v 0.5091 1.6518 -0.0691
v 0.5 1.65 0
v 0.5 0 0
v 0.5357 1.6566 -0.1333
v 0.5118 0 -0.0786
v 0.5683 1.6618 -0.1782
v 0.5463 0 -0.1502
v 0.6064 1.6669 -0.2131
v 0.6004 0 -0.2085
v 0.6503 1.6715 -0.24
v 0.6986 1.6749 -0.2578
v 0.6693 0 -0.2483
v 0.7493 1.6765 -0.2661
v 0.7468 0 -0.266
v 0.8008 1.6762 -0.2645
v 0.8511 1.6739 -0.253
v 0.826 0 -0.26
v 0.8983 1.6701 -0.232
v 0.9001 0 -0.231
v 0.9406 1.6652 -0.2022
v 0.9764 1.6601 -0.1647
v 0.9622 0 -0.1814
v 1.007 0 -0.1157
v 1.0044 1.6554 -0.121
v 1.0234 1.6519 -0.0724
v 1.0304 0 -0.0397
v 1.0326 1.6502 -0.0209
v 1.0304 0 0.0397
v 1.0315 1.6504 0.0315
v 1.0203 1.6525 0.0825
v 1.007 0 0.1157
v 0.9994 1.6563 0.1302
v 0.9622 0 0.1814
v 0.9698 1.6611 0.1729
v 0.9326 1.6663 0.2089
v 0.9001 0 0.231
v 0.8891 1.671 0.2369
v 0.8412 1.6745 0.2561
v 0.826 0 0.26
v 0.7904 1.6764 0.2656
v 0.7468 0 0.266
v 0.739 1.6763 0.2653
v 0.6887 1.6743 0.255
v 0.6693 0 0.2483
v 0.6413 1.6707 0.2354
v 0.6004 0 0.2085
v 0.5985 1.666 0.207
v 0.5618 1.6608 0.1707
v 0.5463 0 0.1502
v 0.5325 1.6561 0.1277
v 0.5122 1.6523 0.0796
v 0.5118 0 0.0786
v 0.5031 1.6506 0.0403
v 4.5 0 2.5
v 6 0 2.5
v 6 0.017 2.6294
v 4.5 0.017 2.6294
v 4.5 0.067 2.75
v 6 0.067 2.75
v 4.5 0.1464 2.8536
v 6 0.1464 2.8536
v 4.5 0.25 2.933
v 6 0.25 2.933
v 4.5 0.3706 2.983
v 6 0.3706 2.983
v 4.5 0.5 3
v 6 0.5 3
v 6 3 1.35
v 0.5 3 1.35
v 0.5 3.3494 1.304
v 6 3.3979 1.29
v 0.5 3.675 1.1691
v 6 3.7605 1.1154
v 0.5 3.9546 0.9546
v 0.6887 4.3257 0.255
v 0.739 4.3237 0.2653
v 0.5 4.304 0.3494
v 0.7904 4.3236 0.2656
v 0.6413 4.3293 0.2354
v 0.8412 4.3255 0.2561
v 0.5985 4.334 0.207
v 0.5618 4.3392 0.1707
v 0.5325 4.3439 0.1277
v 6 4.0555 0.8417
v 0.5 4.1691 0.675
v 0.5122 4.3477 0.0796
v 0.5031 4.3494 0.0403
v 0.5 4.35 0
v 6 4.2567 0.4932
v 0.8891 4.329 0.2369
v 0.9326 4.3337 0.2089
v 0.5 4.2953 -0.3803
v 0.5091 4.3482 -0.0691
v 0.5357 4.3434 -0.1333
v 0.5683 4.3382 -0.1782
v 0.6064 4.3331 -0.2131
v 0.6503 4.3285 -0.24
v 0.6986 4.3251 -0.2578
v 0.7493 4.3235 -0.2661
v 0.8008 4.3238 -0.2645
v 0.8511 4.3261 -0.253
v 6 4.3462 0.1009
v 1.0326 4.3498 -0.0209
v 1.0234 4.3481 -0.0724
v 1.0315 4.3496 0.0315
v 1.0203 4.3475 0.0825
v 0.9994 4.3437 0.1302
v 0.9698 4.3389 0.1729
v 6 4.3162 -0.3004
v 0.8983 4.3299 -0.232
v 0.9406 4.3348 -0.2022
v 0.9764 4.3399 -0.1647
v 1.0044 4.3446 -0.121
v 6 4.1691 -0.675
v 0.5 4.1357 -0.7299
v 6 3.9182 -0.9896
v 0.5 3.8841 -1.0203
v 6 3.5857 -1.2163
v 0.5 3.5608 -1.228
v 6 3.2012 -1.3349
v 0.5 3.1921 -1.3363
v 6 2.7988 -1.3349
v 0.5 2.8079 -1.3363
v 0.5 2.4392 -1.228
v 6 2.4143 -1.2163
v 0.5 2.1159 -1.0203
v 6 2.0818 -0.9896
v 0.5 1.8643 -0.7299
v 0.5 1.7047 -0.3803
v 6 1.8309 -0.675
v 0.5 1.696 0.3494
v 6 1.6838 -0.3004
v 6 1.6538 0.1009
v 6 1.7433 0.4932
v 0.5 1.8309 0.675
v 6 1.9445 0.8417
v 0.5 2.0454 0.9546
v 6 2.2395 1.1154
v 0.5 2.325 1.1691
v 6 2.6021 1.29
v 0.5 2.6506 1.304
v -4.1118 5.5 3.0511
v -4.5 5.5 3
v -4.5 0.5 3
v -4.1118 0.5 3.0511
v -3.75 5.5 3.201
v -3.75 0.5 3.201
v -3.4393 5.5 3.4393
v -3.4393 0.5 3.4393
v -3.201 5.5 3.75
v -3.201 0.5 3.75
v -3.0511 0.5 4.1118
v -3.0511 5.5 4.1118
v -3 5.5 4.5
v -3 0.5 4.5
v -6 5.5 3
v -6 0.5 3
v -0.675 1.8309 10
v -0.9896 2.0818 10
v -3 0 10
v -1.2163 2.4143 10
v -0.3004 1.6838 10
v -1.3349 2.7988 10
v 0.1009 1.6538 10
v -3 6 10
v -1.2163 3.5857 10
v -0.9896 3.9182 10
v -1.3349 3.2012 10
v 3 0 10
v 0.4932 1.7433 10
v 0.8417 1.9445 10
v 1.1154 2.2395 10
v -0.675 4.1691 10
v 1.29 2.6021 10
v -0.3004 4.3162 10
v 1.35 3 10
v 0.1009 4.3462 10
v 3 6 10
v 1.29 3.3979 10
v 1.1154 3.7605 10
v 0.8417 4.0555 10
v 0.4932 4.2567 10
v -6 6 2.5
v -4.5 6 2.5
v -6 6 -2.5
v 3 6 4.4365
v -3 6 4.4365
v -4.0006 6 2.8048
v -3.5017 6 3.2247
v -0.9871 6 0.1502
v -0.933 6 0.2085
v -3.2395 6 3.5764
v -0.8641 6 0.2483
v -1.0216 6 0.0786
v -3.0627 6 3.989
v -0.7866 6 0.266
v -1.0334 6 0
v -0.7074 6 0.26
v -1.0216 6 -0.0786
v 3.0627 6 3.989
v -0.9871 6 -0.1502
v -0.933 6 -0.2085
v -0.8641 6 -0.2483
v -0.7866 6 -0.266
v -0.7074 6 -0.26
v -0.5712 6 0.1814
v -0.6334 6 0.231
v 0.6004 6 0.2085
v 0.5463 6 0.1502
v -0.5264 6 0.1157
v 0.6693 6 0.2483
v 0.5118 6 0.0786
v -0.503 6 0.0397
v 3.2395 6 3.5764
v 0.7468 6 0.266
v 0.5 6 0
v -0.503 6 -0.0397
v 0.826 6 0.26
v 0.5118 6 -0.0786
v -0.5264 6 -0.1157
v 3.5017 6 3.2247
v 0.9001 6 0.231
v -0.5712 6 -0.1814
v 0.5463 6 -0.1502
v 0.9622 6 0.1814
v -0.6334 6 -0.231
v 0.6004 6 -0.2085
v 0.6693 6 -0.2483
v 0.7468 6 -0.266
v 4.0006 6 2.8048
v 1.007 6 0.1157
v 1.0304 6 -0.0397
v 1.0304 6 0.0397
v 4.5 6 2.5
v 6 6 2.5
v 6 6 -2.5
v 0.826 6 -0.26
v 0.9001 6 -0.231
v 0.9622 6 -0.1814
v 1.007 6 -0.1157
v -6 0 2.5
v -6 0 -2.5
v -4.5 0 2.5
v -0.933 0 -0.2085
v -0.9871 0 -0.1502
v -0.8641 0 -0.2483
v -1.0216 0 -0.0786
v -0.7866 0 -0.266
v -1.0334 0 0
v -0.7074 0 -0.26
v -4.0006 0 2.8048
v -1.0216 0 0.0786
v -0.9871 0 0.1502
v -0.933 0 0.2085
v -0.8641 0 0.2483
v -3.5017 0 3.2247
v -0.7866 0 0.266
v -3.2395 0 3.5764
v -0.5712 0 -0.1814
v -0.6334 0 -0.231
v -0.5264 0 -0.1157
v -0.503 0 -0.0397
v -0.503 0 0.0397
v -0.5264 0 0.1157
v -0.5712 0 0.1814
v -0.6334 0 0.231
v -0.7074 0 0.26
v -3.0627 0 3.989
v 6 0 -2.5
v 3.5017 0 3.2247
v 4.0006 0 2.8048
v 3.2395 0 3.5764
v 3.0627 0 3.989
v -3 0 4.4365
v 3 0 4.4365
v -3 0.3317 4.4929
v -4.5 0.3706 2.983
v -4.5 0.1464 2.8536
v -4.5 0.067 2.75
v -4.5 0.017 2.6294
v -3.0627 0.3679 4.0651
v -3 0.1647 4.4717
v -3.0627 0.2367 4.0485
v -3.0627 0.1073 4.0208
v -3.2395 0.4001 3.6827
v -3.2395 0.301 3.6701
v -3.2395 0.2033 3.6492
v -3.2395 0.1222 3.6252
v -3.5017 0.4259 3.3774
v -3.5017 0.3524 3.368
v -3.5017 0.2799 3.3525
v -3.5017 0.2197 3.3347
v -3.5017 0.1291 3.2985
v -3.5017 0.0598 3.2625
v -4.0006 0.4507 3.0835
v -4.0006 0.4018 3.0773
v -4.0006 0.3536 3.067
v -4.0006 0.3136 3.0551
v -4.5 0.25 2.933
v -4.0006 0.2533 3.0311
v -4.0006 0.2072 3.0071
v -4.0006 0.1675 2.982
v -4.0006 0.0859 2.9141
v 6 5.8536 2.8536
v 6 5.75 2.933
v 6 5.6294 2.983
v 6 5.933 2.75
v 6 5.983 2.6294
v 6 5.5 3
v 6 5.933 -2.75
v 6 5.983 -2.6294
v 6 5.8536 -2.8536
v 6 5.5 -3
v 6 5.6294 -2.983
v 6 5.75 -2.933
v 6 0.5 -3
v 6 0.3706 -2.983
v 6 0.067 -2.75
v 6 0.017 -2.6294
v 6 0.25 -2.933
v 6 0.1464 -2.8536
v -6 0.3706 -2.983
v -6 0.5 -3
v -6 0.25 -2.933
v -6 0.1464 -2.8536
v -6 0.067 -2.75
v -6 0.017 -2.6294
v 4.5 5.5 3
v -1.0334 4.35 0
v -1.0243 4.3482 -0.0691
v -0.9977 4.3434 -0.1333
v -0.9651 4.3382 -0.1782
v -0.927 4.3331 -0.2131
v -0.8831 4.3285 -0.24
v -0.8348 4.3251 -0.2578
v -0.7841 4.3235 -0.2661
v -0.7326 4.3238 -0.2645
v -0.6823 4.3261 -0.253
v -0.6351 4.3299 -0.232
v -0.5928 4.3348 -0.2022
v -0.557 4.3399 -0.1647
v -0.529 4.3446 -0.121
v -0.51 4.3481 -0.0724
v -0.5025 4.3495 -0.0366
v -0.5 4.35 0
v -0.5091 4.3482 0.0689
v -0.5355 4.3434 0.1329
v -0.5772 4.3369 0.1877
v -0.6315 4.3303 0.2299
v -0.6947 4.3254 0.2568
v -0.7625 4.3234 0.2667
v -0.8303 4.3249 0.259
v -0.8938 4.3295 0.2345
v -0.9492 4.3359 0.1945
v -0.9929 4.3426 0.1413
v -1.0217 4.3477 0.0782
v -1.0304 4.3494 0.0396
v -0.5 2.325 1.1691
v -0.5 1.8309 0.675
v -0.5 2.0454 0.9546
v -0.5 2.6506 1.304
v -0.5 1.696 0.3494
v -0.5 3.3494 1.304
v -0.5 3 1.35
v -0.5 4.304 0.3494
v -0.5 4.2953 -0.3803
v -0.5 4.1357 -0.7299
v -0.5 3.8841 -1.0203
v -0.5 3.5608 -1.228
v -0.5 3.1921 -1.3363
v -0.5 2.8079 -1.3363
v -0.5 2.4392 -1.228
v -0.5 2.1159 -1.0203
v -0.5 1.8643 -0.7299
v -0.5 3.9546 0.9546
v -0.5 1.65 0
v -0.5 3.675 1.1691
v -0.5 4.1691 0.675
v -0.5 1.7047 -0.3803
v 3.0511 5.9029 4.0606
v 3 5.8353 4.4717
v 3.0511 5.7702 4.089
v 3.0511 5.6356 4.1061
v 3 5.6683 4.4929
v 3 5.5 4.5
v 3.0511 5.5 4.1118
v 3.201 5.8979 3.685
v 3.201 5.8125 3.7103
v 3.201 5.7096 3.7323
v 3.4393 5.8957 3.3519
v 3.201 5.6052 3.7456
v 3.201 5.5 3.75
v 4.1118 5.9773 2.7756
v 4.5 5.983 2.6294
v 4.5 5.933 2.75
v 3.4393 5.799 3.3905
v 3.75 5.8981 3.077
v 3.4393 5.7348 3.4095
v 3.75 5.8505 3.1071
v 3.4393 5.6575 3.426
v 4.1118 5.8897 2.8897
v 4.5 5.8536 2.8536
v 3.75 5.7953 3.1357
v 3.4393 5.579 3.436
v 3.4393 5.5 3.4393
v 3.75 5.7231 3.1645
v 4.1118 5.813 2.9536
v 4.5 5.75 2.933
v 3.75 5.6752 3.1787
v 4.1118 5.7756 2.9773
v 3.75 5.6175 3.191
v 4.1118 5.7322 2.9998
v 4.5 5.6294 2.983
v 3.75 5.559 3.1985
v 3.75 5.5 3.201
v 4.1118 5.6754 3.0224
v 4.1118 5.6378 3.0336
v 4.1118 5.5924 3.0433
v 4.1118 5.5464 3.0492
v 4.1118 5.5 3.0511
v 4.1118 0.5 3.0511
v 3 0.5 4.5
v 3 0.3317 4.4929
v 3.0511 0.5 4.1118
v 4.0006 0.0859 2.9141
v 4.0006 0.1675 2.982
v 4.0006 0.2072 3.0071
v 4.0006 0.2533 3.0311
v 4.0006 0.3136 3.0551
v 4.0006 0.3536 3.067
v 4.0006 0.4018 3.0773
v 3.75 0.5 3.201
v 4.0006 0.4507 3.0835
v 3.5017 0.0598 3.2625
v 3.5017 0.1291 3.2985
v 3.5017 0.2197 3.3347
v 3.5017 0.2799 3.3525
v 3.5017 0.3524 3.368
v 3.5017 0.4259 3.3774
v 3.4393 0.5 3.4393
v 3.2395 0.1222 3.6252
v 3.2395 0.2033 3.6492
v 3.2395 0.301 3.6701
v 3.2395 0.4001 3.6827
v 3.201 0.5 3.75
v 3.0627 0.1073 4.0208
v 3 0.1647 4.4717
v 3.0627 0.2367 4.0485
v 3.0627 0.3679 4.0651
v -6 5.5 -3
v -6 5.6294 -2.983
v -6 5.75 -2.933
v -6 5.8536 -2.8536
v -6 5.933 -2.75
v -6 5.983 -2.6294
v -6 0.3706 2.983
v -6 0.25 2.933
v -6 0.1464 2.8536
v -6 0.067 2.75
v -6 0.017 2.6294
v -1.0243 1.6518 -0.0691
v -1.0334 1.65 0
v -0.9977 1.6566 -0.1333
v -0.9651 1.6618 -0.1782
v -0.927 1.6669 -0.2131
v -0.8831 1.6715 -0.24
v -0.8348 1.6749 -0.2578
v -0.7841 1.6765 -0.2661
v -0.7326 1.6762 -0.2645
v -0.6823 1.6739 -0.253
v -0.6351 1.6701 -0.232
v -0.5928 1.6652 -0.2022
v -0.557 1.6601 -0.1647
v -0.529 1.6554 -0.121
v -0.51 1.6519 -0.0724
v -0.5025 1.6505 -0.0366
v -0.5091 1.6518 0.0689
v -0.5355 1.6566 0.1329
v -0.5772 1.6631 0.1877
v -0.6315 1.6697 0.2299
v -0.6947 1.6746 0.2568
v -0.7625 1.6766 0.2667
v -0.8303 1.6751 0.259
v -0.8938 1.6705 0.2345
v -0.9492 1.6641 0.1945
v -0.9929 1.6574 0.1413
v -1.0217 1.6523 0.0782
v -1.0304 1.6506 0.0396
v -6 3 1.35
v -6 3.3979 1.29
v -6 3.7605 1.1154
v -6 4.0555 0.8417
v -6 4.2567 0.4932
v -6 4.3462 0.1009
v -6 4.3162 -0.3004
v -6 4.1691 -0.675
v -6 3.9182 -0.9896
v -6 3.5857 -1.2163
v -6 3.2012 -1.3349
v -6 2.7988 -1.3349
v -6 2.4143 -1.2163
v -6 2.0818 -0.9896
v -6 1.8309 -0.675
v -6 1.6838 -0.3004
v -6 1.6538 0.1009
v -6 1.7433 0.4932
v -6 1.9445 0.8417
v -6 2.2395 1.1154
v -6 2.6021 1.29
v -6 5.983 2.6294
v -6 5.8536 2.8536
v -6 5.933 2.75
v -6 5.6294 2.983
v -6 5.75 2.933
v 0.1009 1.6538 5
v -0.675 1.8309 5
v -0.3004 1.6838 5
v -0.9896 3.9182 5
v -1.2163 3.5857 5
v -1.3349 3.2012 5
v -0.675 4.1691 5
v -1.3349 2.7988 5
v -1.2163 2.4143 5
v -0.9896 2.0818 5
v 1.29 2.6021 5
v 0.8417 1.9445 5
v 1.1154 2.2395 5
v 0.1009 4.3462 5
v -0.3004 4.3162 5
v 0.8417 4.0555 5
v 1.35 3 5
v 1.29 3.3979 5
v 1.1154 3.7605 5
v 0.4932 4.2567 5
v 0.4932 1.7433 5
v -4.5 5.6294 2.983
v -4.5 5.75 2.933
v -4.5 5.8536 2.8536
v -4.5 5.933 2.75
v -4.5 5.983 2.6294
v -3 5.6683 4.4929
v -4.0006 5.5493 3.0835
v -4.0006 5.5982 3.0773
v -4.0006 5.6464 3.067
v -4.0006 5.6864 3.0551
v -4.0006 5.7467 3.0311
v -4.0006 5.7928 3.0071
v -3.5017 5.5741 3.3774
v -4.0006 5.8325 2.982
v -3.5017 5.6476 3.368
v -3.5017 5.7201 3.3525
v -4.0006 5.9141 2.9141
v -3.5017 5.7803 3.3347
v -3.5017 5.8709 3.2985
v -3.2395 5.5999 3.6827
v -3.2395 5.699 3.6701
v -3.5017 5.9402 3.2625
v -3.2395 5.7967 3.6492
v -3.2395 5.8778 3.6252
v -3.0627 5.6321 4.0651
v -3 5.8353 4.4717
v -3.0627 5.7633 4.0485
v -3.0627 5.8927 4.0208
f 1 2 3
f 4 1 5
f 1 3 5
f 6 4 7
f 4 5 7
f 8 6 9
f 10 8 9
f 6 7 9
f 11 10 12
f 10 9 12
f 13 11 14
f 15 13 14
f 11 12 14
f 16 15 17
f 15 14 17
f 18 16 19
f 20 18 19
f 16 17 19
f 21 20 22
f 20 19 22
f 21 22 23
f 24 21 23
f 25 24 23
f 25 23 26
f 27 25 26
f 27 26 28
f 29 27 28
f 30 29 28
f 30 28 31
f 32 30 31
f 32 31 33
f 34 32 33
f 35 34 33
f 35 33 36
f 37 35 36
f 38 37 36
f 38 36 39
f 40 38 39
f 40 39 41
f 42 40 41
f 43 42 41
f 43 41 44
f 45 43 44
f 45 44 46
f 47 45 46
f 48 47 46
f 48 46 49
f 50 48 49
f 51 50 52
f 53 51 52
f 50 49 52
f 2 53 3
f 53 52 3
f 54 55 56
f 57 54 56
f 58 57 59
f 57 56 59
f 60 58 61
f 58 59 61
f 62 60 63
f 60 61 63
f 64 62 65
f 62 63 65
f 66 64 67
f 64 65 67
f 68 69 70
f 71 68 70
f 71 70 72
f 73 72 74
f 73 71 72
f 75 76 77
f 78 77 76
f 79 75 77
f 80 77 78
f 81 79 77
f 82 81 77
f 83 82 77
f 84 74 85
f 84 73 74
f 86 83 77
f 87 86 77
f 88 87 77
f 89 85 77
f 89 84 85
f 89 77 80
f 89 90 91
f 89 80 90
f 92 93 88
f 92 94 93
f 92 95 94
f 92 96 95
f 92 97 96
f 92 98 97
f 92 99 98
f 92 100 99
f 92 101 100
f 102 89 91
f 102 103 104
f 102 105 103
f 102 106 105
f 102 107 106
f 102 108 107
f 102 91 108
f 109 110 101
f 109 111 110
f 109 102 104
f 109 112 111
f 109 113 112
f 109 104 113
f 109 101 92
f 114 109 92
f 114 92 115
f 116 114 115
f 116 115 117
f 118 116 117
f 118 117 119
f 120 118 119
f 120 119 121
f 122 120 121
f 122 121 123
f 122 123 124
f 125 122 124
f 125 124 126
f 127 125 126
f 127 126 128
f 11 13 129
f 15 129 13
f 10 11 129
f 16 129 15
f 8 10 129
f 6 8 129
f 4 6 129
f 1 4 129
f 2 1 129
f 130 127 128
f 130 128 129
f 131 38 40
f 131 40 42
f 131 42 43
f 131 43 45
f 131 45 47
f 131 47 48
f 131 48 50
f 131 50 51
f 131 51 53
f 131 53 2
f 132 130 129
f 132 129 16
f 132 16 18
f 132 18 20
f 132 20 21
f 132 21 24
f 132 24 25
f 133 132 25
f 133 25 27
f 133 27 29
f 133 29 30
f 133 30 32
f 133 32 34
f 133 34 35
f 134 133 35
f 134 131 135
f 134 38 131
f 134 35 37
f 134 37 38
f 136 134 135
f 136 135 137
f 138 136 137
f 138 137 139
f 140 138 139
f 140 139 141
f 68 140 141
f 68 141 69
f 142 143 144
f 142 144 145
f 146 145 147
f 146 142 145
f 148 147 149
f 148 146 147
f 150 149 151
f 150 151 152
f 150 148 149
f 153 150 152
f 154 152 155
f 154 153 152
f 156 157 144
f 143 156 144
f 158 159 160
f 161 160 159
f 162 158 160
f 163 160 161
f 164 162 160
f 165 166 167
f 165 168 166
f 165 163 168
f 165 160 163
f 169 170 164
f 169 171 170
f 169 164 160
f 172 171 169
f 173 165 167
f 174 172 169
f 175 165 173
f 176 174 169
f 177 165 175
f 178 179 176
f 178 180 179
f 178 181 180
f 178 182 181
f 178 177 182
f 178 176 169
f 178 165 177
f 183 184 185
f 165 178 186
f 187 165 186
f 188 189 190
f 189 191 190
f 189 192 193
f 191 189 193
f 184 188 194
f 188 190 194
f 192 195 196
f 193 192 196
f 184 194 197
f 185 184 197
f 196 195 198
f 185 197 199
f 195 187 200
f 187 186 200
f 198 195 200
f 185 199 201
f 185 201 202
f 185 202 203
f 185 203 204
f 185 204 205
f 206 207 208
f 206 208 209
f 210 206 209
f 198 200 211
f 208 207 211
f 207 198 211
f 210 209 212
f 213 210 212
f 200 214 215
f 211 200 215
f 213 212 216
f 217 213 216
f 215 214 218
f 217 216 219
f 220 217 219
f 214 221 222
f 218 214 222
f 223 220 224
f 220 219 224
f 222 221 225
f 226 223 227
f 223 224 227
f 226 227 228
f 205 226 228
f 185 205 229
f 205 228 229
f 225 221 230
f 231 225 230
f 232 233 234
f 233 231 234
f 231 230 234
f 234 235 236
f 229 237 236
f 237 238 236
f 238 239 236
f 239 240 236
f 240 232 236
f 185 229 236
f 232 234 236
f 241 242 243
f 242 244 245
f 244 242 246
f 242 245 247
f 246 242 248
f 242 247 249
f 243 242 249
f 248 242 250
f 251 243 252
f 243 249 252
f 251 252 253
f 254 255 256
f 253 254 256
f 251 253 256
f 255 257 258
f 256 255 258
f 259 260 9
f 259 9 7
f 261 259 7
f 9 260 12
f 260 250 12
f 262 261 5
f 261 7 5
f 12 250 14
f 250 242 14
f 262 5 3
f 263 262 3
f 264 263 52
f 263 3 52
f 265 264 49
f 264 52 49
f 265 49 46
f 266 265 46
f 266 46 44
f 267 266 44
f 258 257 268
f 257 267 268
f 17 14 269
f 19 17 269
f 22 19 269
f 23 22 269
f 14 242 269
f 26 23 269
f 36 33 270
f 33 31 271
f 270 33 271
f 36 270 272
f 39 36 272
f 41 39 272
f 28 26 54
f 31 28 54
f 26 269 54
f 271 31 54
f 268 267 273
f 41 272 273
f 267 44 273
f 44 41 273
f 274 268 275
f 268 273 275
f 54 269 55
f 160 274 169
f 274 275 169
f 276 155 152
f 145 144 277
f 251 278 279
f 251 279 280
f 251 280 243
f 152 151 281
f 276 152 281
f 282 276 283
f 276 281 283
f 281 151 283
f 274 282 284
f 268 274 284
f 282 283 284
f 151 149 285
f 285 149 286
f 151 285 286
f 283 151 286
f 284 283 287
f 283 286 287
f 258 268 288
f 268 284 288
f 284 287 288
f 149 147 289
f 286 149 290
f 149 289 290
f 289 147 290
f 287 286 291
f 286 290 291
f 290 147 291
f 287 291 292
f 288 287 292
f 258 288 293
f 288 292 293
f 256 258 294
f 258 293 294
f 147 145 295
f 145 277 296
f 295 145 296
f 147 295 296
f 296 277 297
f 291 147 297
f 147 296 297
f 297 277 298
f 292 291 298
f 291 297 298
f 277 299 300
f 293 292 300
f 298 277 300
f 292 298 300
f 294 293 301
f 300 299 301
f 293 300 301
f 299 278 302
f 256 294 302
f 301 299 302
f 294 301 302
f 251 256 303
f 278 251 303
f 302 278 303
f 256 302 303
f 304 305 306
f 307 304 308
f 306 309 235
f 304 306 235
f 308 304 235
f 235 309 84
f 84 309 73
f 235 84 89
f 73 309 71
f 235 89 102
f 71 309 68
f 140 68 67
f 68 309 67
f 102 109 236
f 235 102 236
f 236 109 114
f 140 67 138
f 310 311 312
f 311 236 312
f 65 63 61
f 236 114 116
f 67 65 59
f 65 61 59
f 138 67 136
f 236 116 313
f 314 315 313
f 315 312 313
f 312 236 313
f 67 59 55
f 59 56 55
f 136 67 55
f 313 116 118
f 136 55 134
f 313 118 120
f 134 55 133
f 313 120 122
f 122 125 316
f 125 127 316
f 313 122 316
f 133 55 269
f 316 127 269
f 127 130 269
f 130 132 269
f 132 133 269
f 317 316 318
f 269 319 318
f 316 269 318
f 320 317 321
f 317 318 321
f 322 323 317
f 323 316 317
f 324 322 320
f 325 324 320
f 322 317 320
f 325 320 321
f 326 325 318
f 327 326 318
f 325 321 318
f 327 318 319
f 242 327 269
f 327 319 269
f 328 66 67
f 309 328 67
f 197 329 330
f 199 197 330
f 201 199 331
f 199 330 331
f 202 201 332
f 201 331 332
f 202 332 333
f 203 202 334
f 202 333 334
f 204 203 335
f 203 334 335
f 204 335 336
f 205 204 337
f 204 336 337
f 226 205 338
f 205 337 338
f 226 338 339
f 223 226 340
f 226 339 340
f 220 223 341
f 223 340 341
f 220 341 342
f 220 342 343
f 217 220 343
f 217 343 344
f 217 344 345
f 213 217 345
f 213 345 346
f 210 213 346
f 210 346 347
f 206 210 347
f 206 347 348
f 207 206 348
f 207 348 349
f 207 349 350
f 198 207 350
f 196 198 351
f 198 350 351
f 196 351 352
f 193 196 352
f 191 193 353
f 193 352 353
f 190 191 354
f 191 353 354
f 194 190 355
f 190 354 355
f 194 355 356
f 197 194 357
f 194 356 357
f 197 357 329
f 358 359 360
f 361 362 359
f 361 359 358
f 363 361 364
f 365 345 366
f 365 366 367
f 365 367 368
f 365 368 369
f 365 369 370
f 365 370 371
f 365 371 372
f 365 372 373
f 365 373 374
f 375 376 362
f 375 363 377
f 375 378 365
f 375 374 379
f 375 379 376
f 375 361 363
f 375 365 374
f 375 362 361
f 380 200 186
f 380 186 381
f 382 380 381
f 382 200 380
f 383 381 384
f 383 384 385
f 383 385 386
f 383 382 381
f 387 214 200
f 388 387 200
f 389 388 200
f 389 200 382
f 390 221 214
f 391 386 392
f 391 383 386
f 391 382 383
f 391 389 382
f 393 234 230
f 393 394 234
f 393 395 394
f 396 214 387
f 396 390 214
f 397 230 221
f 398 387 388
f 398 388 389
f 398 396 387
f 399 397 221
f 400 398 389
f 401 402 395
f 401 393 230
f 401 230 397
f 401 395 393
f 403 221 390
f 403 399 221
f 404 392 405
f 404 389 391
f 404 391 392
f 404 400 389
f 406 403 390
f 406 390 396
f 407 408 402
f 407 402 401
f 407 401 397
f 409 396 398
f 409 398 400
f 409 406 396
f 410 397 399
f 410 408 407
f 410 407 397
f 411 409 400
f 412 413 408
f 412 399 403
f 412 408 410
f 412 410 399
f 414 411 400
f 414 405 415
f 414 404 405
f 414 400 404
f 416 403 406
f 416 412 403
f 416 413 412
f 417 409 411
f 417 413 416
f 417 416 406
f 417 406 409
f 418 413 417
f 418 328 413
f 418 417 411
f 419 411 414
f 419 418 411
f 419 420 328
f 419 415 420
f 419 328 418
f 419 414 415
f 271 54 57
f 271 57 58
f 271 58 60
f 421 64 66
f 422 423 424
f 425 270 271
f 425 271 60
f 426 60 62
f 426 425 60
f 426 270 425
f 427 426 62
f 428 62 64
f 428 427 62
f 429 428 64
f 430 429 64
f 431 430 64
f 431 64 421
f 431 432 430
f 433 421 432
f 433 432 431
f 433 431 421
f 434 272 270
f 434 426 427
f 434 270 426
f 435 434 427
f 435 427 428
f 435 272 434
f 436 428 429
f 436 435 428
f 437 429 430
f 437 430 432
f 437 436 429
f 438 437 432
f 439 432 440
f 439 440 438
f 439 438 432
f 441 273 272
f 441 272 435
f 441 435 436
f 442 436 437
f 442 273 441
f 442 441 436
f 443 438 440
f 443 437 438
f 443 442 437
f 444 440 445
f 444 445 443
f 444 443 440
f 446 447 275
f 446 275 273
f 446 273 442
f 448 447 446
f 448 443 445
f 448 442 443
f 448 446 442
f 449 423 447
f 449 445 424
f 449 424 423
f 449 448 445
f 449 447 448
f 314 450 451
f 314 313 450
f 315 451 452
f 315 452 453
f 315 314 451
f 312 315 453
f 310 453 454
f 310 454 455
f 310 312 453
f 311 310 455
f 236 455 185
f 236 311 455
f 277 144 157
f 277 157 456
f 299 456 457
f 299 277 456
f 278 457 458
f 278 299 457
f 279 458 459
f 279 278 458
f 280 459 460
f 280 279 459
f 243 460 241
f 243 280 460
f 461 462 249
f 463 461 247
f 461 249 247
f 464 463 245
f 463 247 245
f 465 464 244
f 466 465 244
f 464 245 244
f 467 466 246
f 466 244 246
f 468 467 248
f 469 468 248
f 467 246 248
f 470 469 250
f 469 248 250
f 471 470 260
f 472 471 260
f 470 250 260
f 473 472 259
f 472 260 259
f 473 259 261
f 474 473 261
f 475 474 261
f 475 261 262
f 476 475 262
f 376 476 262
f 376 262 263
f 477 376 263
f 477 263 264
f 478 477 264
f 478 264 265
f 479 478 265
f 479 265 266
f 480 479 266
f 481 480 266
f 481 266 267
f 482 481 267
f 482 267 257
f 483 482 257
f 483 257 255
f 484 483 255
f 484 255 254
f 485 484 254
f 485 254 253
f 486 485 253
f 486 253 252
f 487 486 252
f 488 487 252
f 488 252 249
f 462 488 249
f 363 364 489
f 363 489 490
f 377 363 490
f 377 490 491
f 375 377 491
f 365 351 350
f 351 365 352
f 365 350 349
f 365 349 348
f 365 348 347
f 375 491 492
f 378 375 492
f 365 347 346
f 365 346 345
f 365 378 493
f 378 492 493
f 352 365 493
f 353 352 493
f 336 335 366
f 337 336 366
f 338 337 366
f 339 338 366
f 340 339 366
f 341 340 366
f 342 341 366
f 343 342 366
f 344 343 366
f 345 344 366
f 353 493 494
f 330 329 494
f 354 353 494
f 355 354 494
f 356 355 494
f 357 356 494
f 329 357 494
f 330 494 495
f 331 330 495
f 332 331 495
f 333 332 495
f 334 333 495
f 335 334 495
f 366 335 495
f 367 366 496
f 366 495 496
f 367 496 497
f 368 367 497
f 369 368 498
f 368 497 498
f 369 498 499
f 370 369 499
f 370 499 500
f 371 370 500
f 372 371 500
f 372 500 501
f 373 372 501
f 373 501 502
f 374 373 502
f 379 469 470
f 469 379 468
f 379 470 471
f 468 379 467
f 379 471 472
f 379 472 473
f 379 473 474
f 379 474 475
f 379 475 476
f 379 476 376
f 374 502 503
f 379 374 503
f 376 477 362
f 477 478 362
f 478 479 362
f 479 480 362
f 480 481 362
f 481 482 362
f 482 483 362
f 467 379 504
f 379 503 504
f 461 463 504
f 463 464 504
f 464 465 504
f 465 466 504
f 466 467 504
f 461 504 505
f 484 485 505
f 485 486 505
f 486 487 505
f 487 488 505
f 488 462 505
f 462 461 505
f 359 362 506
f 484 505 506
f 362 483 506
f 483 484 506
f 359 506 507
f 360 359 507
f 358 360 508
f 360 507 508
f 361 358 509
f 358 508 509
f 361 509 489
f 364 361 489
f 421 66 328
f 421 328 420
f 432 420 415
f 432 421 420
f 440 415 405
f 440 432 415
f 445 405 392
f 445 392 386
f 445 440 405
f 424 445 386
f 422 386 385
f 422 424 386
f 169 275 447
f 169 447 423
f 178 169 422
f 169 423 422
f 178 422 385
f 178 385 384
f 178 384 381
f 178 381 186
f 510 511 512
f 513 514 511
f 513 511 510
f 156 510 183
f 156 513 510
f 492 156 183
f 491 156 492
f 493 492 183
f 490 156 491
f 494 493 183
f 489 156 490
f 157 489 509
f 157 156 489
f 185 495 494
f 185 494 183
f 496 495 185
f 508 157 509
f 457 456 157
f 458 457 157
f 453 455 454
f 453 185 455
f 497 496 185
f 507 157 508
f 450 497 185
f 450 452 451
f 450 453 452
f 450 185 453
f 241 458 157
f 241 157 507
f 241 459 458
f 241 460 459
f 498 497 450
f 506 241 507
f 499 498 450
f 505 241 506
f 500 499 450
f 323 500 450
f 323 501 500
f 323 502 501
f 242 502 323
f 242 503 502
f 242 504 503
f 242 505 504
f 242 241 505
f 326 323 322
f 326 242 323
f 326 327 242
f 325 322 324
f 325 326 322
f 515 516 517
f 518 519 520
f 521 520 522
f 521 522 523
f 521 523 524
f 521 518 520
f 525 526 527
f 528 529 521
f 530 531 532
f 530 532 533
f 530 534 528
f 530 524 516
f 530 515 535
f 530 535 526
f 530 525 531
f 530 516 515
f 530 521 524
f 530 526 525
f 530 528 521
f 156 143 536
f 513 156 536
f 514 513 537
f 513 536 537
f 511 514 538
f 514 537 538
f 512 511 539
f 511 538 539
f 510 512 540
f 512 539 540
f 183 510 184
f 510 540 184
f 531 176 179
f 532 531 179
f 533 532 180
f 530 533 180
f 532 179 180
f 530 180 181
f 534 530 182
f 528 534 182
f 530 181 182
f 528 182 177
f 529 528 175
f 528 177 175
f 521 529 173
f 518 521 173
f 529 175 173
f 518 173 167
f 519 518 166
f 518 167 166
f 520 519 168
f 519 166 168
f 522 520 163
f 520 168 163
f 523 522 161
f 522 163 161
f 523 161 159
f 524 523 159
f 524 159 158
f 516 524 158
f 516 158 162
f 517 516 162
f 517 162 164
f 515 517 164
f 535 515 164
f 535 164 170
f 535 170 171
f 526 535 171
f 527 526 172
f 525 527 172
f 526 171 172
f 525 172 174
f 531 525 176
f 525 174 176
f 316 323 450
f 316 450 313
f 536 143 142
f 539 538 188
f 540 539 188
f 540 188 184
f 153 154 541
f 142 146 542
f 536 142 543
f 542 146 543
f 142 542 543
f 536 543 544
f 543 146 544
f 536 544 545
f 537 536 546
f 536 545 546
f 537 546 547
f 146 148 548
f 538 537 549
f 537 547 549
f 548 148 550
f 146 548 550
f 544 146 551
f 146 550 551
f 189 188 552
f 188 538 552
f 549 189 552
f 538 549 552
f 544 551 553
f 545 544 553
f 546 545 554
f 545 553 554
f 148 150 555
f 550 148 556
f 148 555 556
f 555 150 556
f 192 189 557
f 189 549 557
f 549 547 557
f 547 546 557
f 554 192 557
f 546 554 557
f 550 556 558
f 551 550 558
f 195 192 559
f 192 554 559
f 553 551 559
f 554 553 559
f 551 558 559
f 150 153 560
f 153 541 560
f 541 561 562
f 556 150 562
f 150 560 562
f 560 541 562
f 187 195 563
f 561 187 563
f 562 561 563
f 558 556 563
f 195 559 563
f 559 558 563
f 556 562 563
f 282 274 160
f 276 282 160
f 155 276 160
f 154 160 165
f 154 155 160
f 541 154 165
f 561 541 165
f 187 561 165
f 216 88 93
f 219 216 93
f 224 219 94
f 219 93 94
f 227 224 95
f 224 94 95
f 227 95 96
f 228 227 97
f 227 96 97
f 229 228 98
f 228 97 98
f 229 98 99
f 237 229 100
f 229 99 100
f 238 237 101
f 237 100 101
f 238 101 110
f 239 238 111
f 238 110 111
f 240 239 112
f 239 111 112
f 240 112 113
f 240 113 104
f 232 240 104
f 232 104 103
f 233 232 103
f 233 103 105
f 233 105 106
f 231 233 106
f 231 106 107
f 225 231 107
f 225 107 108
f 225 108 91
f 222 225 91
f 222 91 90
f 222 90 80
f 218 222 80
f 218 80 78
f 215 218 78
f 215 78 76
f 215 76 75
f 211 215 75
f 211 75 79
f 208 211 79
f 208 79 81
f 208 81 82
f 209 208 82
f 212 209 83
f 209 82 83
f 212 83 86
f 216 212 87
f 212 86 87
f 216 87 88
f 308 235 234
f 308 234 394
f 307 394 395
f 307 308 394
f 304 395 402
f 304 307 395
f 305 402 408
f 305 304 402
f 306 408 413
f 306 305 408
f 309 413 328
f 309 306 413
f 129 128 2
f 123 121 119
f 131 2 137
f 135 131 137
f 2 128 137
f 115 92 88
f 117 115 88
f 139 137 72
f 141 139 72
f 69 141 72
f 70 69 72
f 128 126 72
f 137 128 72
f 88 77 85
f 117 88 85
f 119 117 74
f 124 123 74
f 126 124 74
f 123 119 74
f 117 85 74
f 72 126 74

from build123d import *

# Parameters (mm, degrees)
SKETCH1_W                   = 12
SKETCH1_H                   = 6
BOSS_EXTRUDE1_DEPTH         = 6
F_75_0_021_DIAMETER_HOLE1_D = 0.5334
SKETCH15_W                  = 6
SKETCH15_H                  = 6
BOSS_EXTRUDE2_DEPTH         = 7
FILLET4_R                   = 0.5
FILLET3_R                   = 1.5
SKETCH19_R                  = 1.35
CUT_EXTRUDE1_DEPTH          = 5.5
SKETCH16_R                  = 1.35
CUT_EXTRUDE2_DEPTH          = 5


with BuildPart() as part:
    # Sketch1 → Boss-Extrude1 (new body)
    with BuildSketch(Plane(origin=(0, 0, 0), x_dir=(1, 0, 0), z_dir=(0, 1, 0))):
        Rectangle(SKETCH1_W, SKETCH1_H)
    extrude(amount=BOSS_EXTRUDE1_DEPTH)

    # #75 (0.021) Diameter Hole1 (through all)
    with Locations(Plane(origin=(0, 6, 0), x_dir=(1, 0, 0), z_dir=(0, 1, 0))):
        with Locations((0.7667, 0), (-0.7667, 0)):
            Hole(F_75_0_021_DIAMETER_HOLE1_D / 2)

    # Sketch15 → Boss-Extrude2 (add)
    with BuildSketch(Plane.XY.offset(3)):
        with Locations((0, 3)):
            Rectangle(SKETCH15_W, SKETCH15_H)
    extrude(amount=BOSS_EXTRUDE2_DEPTH)

    # Fillet4
    fillet4_edges = [part.edges().sort_by_distance(p)[0] for p in [
        (4.5, 6, 3),
        (4.5, 0, 3),
        (-4.5, 0, 3),
        (0, 0, -3),
        (0, 6, -3),
        (-4.5, 6, 3),
    ]]
    fillet(fillet4_edges, radius=FILLET4_R)

    # Fillet3
    fillet3_edges = [part.edges().sort_by_distance(p)[0] for p in [
        (-3, 3, 3),
        (-3, 0.146446609, 2.853553391),
        (-3, 5.853553391, 2.853553391),
    ]]
    fillet(fillet3_edges, radius=FILLET3_R)
    fillet3_2_edges = [part.edges().sort_by_distance(p)[0] for p in [
        (3, 5.853553391, 2.853553391),
        (3, 3, 3),
        (3, 0.146446609, 2.853553391),
    ]]
    fillet(fillet3_2_edges, radius=FILLET3_R)

    # Sketch19 → Cut-Extrude1 (cut)
    with BuildSketch(Plane.ZY.offset(6)):
        with Locations((0, 3)):
            Circle(SKETCH19_R)
    cut_extrude1 = extrude(amount=-CUT_EXTRUDE1_DEPTH, mode=Mode.SUBTRACT)

    # Sketch16 → Cut-Extrude2 (cut)
    with BuildSketch(Plane.XY.offset(10)):
        with Locations((0, 3)):
            Circle(SKETCH16_R)
    extrude(amount=-CUT_EXTRUDE2_DEPTH, mode=Mode.SUBTRACT)

    # Mirror2: Cut-Extrude1 across plane
    add(cut_extrude1.mirror(Plane(origin=(0, 0, 0), x_dir=(0, 0, 1), z_dir=(1, 0, 0))), mode=Mode.SUBTRACT)


solid = part.part
